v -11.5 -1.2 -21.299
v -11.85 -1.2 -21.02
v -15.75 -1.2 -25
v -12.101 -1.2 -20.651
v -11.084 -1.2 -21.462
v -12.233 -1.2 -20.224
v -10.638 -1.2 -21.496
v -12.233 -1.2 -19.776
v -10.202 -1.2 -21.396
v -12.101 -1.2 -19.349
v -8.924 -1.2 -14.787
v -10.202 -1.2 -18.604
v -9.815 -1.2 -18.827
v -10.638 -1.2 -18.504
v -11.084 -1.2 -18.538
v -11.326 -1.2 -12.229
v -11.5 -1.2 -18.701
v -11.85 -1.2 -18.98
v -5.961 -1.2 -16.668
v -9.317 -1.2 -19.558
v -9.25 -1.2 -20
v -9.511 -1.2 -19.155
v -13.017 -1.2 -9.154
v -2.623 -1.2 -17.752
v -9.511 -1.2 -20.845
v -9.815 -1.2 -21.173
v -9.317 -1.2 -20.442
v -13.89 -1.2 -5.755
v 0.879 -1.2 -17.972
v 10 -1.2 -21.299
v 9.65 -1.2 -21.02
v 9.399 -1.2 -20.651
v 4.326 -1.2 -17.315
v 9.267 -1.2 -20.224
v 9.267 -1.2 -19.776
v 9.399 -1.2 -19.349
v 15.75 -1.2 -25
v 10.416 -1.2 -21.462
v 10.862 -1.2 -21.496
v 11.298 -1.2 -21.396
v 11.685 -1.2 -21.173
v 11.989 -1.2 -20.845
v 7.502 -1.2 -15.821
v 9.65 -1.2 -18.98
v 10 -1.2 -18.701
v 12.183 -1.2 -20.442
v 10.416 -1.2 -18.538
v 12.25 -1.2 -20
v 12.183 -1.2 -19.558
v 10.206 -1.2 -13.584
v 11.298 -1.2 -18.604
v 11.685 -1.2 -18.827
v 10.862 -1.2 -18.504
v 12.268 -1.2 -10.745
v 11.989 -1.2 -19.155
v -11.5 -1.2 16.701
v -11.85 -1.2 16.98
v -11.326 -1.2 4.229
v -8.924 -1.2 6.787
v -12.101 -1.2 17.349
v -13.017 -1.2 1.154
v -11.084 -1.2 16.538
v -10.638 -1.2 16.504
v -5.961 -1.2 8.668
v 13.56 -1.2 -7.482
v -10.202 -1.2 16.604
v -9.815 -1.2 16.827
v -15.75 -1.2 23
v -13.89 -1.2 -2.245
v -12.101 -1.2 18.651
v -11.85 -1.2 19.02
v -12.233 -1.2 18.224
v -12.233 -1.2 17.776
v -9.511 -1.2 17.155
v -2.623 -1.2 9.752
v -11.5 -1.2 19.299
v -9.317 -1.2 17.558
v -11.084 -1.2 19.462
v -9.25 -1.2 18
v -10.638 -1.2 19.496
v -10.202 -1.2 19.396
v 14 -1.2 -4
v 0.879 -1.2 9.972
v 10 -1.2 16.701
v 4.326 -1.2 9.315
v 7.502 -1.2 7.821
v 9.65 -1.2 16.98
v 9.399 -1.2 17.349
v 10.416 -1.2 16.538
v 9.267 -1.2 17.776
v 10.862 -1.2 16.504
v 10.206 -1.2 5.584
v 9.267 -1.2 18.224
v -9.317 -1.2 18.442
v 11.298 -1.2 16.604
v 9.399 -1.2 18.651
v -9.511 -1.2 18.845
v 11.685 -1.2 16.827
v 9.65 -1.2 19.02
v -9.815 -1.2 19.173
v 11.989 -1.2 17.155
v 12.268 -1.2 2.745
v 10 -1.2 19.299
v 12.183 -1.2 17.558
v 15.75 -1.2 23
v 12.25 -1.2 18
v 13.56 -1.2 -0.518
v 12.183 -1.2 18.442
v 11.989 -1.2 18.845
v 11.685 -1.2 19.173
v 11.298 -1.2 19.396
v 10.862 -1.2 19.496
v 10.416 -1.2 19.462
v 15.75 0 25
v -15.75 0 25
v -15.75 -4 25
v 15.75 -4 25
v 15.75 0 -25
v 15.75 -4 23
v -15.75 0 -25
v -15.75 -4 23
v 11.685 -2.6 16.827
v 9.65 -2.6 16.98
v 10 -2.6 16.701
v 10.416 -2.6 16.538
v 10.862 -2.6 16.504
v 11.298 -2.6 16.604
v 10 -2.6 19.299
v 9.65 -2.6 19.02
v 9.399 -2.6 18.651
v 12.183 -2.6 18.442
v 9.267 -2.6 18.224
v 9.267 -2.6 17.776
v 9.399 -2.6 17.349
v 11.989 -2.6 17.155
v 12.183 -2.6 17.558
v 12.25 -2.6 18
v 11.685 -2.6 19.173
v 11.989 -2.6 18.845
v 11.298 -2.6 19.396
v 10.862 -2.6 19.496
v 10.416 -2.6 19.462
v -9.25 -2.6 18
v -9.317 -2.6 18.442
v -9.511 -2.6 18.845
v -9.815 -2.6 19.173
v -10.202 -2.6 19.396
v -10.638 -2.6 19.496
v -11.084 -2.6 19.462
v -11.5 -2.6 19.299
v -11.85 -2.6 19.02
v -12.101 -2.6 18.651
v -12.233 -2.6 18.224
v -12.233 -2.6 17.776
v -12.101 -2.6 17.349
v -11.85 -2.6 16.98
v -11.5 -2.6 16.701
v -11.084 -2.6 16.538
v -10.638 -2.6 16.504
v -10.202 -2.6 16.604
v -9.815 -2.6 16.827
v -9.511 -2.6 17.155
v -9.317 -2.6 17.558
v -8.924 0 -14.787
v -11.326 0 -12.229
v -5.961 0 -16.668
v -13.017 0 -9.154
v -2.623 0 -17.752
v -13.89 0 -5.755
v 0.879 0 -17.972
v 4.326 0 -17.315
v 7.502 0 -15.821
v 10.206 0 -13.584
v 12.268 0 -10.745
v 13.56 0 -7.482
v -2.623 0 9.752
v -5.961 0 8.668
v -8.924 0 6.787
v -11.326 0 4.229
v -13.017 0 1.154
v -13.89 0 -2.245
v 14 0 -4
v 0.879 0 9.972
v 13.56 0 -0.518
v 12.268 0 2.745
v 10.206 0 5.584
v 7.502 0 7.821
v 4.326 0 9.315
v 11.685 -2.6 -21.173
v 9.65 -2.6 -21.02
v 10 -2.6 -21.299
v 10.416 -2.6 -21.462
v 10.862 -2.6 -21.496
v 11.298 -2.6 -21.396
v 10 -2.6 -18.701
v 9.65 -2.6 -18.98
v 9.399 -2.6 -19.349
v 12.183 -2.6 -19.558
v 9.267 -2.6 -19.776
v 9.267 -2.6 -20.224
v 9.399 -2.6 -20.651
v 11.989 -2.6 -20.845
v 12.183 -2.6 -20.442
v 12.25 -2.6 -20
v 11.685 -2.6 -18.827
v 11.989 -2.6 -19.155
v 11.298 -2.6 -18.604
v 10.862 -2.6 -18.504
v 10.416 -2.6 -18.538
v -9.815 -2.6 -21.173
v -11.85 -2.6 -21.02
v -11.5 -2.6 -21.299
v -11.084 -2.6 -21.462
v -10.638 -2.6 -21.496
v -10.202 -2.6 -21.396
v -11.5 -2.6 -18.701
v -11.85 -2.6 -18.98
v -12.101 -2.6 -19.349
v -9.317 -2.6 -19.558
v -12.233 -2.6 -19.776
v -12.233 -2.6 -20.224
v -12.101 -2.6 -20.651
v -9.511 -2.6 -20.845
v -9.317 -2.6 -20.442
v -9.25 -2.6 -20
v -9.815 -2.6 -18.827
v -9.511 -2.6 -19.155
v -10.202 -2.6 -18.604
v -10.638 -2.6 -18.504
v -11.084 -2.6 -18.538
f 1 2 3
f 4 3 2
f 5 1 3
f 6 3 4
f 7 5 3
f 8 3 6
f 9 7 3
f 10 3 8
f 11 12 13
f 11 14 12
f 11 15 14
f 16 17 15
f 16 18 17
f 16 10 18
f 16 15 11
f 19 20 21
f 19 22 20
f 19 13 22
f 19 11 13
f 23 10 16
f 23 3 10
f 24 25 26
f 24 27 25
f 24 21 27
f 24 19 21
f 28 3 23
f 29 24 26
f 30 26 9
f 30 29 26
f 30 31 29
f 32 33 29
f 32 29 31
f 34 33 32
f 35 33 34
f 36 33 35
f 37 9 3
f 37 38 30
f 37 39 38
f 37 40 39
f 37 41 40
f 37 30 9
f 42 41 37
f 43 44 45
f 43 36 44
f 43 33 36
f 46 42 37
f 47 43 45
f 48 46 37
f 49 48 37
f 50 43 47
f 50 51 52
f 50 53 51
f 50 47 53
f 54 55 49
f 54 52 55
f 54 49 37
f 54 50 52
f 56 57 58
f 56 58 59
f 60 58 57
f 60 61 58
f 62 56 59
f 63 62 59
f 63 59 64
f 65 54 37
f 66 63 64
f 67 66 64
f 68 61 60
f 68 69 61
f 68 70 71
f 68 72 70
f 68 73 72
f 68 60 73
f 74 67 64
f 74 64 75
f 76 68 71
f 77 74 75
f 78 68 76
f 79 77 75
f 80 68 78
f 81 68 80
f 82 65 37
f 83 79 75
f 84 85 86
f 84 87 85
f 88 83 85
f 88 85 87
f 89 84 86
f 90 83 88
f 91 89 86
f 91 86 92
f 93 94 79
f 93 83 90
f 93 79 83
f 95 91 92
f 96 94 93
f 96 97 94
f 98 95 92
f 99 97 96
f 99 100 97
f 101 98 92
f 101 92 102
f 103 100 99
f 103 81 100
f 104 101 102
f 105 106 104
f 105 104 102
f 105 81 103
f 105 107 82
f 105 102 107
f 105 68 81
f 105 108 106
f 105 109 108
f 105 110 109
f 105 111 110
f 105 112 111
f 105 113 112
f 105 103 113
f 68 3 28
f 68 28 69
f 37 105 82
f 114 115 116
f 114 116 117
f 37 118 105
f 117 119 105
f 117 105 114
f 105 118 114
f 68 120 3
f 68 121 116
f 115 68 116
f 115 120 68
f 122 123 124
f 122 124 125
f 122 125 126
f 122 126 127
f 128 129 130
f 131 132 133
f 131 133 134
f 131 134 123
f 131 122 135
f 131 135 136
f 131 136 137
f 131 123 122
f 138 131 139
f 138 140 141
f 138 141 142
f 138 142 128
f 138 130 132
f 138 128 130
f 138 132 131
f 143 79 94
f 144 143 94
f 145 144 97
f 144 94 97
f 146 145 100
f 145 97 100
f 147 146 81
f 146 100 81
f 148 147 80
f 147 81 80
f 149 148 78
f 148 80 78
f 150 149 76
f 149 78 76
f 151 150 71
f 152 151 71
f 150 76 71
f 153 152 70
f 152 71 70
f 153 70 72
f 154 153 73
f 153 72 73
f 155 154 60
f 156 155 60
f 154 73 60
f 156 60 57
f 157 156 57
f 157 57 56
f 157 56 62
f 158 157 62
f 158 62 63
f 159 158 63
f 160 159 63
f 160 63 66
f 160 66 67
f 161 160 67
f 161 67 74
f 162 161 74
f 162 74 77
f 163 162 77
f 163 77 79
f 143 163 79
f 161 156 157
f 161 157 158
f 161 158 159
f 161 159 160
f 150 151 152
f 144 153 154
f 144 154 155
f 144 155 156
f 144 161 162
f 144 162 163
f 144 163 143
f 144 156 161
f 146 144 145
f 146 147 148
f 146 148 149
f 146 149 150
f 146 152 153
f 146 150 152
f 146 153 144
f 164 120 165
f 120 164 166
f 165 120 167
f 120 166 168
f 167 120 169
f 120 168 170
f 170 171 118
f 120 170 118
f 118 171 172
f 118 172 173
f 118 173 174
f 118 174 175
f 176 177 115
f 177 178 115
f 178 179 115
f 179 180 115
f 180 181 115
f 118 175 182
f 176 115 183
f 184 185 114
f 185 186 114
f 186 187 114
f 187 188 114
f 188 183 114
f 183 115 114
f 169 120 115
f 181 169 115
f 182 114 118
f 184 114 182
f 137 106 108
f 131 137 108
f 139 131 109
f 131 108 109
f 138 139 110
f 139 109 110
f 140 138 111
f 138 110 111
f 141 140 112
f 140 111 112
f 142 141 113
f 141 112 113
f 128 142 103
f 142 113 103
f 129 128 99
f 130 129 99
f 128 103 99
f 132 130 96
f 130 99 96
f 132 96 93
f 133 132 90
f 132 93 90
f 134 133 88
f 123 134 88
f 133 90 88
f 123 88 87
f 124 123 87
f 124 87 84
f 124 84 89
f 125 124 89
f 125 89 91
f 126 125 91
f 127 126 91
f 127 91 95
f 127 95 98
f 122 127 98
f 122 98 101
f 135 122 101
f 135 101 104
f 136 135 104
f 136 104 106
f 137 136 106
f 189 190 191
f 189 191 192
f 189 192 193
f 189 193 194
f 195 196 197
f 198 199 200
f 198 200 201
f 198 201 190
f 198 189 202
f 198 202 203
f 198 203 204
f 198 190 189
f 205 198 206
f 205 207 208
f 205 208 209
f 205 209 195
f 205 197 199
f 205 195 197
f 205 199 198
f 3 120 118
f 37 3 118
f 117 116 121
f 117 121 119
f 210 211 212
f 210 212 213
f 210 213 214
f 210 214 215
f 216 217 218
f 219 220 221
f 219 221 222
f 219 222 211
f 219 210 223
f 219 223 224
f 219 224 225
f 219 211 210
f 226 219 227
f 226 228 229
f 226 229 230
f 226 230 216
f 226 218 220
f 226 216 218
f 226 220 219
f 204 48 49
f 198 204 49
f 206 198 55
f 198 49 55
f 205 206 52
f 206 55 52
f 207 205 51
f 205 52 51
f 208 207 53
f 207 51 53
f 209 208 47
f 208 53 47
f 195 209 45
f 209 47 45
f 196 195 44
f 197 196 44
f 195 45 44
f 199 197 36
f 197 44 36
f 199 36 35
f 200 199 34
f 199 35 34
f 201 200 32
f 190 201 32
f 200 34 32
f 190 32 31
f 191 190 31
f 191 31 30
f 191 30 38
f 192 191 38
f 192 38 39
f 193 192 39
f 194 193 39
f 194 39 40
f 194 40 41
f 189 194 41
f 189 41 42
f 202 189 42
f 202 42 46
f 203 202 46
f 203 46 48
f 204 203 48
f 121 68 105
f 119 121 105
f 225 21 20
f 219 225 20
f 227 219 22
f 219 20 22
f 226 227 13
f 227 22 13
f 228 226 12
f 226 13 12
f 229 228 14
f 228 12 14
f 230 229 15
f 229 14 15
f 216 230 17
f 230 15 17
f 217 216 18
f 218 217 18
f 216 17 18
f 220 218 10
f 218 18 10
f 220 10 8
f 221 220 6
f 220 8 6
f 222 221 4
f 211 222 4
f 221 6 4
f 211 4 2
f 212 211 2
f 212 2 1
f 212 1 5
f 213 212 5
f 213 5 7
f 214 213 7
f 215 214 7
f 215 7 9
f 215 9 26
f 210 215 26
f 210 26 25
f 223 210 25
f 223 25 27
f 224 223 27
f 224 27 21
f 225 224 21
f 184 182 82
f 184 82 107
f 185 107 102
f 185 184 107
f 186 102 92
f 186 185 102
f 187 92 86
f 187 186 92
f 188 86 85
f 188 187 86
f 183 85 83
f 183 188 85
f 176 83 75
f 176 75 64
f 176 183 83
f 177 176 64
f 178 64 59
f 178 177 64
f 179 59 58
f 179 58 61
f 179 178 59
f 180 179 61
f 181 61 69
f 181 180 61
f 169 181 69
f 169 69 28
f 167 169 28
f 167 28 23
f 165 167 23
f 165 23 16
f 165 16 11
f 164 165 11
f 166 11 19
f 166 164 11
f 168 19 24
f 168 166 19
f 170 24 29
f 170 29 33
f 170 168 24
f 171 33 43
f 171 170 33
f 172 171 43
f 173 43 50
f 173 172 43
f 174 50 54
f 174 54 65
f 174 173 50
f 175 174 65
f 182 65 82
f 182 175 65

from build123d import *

# Parameters (mm, degrees)
F0_W     = 31.5
F0_H     = 48
F0_R     = 1.5
F0_R_2   = 14
F1_DEPTH = 1.2
F0_H_2   = 2
F2_DEPTH = 1.2
F3_DEPTH = 2.6
F4_DEPTH = 4


with BuildPart() as f1:
    # F0 (on Front) → F1 (new body)
    with BuildSketch(Plane.XZ):
        with Locations((0, -1)):
            Rectangle(F0_W, F0_H)
        with Locations((-10.75, -20)):
            Circle(F0_R, mode=Mode.SUBTRACT)
        with Locations((10.75, -20)):
            Circle(F0_R, mode=Mode.SUBTRACT)
        with Locations((0, -4)):
            Circle(F0_R_2, mode=Mode.SUBTRACT)
        with Locations((-10.75, 18)):
            Circle(F0_R, mode=Mode.SUBTRACT)
        with Locations((10.75, 18)):
            Circle(F0_R, mode=Mode.SUBTRACT)
    extrude(amount=F1_DEPTH)

    # F0 (on Front) → F2 (join)
    with BuildSketch(Plane.XZ):
        with Locations((0, 24)):
            Rectangle(F0_W, F0_H_2)
    extrude(amount=F2_DEPTH)

    # F0 (on Front) → F3 (join)
    with BuildSketch(Plane.XZ):
        with Locations((-10.75, 18)):
            Circle(F0_R)
        with Locations((10.75, 18)):
            Circle(F0_R)
        with Locations((10.75, -20)):
            Circle(F0_R)
        with Locations((-10.75, -20)):
            Circle(F0_R)
    extrude(amount=F3_DEPTH)

    # F0 (on Front) → F4 (join)
    with BuildSketch(Plane.XZ):
        with Locations((0, 24)):
            Rectangle(F0_W, F0_H_2)
    extrude(amount=F4_DEPTH)


solid = f1.part
